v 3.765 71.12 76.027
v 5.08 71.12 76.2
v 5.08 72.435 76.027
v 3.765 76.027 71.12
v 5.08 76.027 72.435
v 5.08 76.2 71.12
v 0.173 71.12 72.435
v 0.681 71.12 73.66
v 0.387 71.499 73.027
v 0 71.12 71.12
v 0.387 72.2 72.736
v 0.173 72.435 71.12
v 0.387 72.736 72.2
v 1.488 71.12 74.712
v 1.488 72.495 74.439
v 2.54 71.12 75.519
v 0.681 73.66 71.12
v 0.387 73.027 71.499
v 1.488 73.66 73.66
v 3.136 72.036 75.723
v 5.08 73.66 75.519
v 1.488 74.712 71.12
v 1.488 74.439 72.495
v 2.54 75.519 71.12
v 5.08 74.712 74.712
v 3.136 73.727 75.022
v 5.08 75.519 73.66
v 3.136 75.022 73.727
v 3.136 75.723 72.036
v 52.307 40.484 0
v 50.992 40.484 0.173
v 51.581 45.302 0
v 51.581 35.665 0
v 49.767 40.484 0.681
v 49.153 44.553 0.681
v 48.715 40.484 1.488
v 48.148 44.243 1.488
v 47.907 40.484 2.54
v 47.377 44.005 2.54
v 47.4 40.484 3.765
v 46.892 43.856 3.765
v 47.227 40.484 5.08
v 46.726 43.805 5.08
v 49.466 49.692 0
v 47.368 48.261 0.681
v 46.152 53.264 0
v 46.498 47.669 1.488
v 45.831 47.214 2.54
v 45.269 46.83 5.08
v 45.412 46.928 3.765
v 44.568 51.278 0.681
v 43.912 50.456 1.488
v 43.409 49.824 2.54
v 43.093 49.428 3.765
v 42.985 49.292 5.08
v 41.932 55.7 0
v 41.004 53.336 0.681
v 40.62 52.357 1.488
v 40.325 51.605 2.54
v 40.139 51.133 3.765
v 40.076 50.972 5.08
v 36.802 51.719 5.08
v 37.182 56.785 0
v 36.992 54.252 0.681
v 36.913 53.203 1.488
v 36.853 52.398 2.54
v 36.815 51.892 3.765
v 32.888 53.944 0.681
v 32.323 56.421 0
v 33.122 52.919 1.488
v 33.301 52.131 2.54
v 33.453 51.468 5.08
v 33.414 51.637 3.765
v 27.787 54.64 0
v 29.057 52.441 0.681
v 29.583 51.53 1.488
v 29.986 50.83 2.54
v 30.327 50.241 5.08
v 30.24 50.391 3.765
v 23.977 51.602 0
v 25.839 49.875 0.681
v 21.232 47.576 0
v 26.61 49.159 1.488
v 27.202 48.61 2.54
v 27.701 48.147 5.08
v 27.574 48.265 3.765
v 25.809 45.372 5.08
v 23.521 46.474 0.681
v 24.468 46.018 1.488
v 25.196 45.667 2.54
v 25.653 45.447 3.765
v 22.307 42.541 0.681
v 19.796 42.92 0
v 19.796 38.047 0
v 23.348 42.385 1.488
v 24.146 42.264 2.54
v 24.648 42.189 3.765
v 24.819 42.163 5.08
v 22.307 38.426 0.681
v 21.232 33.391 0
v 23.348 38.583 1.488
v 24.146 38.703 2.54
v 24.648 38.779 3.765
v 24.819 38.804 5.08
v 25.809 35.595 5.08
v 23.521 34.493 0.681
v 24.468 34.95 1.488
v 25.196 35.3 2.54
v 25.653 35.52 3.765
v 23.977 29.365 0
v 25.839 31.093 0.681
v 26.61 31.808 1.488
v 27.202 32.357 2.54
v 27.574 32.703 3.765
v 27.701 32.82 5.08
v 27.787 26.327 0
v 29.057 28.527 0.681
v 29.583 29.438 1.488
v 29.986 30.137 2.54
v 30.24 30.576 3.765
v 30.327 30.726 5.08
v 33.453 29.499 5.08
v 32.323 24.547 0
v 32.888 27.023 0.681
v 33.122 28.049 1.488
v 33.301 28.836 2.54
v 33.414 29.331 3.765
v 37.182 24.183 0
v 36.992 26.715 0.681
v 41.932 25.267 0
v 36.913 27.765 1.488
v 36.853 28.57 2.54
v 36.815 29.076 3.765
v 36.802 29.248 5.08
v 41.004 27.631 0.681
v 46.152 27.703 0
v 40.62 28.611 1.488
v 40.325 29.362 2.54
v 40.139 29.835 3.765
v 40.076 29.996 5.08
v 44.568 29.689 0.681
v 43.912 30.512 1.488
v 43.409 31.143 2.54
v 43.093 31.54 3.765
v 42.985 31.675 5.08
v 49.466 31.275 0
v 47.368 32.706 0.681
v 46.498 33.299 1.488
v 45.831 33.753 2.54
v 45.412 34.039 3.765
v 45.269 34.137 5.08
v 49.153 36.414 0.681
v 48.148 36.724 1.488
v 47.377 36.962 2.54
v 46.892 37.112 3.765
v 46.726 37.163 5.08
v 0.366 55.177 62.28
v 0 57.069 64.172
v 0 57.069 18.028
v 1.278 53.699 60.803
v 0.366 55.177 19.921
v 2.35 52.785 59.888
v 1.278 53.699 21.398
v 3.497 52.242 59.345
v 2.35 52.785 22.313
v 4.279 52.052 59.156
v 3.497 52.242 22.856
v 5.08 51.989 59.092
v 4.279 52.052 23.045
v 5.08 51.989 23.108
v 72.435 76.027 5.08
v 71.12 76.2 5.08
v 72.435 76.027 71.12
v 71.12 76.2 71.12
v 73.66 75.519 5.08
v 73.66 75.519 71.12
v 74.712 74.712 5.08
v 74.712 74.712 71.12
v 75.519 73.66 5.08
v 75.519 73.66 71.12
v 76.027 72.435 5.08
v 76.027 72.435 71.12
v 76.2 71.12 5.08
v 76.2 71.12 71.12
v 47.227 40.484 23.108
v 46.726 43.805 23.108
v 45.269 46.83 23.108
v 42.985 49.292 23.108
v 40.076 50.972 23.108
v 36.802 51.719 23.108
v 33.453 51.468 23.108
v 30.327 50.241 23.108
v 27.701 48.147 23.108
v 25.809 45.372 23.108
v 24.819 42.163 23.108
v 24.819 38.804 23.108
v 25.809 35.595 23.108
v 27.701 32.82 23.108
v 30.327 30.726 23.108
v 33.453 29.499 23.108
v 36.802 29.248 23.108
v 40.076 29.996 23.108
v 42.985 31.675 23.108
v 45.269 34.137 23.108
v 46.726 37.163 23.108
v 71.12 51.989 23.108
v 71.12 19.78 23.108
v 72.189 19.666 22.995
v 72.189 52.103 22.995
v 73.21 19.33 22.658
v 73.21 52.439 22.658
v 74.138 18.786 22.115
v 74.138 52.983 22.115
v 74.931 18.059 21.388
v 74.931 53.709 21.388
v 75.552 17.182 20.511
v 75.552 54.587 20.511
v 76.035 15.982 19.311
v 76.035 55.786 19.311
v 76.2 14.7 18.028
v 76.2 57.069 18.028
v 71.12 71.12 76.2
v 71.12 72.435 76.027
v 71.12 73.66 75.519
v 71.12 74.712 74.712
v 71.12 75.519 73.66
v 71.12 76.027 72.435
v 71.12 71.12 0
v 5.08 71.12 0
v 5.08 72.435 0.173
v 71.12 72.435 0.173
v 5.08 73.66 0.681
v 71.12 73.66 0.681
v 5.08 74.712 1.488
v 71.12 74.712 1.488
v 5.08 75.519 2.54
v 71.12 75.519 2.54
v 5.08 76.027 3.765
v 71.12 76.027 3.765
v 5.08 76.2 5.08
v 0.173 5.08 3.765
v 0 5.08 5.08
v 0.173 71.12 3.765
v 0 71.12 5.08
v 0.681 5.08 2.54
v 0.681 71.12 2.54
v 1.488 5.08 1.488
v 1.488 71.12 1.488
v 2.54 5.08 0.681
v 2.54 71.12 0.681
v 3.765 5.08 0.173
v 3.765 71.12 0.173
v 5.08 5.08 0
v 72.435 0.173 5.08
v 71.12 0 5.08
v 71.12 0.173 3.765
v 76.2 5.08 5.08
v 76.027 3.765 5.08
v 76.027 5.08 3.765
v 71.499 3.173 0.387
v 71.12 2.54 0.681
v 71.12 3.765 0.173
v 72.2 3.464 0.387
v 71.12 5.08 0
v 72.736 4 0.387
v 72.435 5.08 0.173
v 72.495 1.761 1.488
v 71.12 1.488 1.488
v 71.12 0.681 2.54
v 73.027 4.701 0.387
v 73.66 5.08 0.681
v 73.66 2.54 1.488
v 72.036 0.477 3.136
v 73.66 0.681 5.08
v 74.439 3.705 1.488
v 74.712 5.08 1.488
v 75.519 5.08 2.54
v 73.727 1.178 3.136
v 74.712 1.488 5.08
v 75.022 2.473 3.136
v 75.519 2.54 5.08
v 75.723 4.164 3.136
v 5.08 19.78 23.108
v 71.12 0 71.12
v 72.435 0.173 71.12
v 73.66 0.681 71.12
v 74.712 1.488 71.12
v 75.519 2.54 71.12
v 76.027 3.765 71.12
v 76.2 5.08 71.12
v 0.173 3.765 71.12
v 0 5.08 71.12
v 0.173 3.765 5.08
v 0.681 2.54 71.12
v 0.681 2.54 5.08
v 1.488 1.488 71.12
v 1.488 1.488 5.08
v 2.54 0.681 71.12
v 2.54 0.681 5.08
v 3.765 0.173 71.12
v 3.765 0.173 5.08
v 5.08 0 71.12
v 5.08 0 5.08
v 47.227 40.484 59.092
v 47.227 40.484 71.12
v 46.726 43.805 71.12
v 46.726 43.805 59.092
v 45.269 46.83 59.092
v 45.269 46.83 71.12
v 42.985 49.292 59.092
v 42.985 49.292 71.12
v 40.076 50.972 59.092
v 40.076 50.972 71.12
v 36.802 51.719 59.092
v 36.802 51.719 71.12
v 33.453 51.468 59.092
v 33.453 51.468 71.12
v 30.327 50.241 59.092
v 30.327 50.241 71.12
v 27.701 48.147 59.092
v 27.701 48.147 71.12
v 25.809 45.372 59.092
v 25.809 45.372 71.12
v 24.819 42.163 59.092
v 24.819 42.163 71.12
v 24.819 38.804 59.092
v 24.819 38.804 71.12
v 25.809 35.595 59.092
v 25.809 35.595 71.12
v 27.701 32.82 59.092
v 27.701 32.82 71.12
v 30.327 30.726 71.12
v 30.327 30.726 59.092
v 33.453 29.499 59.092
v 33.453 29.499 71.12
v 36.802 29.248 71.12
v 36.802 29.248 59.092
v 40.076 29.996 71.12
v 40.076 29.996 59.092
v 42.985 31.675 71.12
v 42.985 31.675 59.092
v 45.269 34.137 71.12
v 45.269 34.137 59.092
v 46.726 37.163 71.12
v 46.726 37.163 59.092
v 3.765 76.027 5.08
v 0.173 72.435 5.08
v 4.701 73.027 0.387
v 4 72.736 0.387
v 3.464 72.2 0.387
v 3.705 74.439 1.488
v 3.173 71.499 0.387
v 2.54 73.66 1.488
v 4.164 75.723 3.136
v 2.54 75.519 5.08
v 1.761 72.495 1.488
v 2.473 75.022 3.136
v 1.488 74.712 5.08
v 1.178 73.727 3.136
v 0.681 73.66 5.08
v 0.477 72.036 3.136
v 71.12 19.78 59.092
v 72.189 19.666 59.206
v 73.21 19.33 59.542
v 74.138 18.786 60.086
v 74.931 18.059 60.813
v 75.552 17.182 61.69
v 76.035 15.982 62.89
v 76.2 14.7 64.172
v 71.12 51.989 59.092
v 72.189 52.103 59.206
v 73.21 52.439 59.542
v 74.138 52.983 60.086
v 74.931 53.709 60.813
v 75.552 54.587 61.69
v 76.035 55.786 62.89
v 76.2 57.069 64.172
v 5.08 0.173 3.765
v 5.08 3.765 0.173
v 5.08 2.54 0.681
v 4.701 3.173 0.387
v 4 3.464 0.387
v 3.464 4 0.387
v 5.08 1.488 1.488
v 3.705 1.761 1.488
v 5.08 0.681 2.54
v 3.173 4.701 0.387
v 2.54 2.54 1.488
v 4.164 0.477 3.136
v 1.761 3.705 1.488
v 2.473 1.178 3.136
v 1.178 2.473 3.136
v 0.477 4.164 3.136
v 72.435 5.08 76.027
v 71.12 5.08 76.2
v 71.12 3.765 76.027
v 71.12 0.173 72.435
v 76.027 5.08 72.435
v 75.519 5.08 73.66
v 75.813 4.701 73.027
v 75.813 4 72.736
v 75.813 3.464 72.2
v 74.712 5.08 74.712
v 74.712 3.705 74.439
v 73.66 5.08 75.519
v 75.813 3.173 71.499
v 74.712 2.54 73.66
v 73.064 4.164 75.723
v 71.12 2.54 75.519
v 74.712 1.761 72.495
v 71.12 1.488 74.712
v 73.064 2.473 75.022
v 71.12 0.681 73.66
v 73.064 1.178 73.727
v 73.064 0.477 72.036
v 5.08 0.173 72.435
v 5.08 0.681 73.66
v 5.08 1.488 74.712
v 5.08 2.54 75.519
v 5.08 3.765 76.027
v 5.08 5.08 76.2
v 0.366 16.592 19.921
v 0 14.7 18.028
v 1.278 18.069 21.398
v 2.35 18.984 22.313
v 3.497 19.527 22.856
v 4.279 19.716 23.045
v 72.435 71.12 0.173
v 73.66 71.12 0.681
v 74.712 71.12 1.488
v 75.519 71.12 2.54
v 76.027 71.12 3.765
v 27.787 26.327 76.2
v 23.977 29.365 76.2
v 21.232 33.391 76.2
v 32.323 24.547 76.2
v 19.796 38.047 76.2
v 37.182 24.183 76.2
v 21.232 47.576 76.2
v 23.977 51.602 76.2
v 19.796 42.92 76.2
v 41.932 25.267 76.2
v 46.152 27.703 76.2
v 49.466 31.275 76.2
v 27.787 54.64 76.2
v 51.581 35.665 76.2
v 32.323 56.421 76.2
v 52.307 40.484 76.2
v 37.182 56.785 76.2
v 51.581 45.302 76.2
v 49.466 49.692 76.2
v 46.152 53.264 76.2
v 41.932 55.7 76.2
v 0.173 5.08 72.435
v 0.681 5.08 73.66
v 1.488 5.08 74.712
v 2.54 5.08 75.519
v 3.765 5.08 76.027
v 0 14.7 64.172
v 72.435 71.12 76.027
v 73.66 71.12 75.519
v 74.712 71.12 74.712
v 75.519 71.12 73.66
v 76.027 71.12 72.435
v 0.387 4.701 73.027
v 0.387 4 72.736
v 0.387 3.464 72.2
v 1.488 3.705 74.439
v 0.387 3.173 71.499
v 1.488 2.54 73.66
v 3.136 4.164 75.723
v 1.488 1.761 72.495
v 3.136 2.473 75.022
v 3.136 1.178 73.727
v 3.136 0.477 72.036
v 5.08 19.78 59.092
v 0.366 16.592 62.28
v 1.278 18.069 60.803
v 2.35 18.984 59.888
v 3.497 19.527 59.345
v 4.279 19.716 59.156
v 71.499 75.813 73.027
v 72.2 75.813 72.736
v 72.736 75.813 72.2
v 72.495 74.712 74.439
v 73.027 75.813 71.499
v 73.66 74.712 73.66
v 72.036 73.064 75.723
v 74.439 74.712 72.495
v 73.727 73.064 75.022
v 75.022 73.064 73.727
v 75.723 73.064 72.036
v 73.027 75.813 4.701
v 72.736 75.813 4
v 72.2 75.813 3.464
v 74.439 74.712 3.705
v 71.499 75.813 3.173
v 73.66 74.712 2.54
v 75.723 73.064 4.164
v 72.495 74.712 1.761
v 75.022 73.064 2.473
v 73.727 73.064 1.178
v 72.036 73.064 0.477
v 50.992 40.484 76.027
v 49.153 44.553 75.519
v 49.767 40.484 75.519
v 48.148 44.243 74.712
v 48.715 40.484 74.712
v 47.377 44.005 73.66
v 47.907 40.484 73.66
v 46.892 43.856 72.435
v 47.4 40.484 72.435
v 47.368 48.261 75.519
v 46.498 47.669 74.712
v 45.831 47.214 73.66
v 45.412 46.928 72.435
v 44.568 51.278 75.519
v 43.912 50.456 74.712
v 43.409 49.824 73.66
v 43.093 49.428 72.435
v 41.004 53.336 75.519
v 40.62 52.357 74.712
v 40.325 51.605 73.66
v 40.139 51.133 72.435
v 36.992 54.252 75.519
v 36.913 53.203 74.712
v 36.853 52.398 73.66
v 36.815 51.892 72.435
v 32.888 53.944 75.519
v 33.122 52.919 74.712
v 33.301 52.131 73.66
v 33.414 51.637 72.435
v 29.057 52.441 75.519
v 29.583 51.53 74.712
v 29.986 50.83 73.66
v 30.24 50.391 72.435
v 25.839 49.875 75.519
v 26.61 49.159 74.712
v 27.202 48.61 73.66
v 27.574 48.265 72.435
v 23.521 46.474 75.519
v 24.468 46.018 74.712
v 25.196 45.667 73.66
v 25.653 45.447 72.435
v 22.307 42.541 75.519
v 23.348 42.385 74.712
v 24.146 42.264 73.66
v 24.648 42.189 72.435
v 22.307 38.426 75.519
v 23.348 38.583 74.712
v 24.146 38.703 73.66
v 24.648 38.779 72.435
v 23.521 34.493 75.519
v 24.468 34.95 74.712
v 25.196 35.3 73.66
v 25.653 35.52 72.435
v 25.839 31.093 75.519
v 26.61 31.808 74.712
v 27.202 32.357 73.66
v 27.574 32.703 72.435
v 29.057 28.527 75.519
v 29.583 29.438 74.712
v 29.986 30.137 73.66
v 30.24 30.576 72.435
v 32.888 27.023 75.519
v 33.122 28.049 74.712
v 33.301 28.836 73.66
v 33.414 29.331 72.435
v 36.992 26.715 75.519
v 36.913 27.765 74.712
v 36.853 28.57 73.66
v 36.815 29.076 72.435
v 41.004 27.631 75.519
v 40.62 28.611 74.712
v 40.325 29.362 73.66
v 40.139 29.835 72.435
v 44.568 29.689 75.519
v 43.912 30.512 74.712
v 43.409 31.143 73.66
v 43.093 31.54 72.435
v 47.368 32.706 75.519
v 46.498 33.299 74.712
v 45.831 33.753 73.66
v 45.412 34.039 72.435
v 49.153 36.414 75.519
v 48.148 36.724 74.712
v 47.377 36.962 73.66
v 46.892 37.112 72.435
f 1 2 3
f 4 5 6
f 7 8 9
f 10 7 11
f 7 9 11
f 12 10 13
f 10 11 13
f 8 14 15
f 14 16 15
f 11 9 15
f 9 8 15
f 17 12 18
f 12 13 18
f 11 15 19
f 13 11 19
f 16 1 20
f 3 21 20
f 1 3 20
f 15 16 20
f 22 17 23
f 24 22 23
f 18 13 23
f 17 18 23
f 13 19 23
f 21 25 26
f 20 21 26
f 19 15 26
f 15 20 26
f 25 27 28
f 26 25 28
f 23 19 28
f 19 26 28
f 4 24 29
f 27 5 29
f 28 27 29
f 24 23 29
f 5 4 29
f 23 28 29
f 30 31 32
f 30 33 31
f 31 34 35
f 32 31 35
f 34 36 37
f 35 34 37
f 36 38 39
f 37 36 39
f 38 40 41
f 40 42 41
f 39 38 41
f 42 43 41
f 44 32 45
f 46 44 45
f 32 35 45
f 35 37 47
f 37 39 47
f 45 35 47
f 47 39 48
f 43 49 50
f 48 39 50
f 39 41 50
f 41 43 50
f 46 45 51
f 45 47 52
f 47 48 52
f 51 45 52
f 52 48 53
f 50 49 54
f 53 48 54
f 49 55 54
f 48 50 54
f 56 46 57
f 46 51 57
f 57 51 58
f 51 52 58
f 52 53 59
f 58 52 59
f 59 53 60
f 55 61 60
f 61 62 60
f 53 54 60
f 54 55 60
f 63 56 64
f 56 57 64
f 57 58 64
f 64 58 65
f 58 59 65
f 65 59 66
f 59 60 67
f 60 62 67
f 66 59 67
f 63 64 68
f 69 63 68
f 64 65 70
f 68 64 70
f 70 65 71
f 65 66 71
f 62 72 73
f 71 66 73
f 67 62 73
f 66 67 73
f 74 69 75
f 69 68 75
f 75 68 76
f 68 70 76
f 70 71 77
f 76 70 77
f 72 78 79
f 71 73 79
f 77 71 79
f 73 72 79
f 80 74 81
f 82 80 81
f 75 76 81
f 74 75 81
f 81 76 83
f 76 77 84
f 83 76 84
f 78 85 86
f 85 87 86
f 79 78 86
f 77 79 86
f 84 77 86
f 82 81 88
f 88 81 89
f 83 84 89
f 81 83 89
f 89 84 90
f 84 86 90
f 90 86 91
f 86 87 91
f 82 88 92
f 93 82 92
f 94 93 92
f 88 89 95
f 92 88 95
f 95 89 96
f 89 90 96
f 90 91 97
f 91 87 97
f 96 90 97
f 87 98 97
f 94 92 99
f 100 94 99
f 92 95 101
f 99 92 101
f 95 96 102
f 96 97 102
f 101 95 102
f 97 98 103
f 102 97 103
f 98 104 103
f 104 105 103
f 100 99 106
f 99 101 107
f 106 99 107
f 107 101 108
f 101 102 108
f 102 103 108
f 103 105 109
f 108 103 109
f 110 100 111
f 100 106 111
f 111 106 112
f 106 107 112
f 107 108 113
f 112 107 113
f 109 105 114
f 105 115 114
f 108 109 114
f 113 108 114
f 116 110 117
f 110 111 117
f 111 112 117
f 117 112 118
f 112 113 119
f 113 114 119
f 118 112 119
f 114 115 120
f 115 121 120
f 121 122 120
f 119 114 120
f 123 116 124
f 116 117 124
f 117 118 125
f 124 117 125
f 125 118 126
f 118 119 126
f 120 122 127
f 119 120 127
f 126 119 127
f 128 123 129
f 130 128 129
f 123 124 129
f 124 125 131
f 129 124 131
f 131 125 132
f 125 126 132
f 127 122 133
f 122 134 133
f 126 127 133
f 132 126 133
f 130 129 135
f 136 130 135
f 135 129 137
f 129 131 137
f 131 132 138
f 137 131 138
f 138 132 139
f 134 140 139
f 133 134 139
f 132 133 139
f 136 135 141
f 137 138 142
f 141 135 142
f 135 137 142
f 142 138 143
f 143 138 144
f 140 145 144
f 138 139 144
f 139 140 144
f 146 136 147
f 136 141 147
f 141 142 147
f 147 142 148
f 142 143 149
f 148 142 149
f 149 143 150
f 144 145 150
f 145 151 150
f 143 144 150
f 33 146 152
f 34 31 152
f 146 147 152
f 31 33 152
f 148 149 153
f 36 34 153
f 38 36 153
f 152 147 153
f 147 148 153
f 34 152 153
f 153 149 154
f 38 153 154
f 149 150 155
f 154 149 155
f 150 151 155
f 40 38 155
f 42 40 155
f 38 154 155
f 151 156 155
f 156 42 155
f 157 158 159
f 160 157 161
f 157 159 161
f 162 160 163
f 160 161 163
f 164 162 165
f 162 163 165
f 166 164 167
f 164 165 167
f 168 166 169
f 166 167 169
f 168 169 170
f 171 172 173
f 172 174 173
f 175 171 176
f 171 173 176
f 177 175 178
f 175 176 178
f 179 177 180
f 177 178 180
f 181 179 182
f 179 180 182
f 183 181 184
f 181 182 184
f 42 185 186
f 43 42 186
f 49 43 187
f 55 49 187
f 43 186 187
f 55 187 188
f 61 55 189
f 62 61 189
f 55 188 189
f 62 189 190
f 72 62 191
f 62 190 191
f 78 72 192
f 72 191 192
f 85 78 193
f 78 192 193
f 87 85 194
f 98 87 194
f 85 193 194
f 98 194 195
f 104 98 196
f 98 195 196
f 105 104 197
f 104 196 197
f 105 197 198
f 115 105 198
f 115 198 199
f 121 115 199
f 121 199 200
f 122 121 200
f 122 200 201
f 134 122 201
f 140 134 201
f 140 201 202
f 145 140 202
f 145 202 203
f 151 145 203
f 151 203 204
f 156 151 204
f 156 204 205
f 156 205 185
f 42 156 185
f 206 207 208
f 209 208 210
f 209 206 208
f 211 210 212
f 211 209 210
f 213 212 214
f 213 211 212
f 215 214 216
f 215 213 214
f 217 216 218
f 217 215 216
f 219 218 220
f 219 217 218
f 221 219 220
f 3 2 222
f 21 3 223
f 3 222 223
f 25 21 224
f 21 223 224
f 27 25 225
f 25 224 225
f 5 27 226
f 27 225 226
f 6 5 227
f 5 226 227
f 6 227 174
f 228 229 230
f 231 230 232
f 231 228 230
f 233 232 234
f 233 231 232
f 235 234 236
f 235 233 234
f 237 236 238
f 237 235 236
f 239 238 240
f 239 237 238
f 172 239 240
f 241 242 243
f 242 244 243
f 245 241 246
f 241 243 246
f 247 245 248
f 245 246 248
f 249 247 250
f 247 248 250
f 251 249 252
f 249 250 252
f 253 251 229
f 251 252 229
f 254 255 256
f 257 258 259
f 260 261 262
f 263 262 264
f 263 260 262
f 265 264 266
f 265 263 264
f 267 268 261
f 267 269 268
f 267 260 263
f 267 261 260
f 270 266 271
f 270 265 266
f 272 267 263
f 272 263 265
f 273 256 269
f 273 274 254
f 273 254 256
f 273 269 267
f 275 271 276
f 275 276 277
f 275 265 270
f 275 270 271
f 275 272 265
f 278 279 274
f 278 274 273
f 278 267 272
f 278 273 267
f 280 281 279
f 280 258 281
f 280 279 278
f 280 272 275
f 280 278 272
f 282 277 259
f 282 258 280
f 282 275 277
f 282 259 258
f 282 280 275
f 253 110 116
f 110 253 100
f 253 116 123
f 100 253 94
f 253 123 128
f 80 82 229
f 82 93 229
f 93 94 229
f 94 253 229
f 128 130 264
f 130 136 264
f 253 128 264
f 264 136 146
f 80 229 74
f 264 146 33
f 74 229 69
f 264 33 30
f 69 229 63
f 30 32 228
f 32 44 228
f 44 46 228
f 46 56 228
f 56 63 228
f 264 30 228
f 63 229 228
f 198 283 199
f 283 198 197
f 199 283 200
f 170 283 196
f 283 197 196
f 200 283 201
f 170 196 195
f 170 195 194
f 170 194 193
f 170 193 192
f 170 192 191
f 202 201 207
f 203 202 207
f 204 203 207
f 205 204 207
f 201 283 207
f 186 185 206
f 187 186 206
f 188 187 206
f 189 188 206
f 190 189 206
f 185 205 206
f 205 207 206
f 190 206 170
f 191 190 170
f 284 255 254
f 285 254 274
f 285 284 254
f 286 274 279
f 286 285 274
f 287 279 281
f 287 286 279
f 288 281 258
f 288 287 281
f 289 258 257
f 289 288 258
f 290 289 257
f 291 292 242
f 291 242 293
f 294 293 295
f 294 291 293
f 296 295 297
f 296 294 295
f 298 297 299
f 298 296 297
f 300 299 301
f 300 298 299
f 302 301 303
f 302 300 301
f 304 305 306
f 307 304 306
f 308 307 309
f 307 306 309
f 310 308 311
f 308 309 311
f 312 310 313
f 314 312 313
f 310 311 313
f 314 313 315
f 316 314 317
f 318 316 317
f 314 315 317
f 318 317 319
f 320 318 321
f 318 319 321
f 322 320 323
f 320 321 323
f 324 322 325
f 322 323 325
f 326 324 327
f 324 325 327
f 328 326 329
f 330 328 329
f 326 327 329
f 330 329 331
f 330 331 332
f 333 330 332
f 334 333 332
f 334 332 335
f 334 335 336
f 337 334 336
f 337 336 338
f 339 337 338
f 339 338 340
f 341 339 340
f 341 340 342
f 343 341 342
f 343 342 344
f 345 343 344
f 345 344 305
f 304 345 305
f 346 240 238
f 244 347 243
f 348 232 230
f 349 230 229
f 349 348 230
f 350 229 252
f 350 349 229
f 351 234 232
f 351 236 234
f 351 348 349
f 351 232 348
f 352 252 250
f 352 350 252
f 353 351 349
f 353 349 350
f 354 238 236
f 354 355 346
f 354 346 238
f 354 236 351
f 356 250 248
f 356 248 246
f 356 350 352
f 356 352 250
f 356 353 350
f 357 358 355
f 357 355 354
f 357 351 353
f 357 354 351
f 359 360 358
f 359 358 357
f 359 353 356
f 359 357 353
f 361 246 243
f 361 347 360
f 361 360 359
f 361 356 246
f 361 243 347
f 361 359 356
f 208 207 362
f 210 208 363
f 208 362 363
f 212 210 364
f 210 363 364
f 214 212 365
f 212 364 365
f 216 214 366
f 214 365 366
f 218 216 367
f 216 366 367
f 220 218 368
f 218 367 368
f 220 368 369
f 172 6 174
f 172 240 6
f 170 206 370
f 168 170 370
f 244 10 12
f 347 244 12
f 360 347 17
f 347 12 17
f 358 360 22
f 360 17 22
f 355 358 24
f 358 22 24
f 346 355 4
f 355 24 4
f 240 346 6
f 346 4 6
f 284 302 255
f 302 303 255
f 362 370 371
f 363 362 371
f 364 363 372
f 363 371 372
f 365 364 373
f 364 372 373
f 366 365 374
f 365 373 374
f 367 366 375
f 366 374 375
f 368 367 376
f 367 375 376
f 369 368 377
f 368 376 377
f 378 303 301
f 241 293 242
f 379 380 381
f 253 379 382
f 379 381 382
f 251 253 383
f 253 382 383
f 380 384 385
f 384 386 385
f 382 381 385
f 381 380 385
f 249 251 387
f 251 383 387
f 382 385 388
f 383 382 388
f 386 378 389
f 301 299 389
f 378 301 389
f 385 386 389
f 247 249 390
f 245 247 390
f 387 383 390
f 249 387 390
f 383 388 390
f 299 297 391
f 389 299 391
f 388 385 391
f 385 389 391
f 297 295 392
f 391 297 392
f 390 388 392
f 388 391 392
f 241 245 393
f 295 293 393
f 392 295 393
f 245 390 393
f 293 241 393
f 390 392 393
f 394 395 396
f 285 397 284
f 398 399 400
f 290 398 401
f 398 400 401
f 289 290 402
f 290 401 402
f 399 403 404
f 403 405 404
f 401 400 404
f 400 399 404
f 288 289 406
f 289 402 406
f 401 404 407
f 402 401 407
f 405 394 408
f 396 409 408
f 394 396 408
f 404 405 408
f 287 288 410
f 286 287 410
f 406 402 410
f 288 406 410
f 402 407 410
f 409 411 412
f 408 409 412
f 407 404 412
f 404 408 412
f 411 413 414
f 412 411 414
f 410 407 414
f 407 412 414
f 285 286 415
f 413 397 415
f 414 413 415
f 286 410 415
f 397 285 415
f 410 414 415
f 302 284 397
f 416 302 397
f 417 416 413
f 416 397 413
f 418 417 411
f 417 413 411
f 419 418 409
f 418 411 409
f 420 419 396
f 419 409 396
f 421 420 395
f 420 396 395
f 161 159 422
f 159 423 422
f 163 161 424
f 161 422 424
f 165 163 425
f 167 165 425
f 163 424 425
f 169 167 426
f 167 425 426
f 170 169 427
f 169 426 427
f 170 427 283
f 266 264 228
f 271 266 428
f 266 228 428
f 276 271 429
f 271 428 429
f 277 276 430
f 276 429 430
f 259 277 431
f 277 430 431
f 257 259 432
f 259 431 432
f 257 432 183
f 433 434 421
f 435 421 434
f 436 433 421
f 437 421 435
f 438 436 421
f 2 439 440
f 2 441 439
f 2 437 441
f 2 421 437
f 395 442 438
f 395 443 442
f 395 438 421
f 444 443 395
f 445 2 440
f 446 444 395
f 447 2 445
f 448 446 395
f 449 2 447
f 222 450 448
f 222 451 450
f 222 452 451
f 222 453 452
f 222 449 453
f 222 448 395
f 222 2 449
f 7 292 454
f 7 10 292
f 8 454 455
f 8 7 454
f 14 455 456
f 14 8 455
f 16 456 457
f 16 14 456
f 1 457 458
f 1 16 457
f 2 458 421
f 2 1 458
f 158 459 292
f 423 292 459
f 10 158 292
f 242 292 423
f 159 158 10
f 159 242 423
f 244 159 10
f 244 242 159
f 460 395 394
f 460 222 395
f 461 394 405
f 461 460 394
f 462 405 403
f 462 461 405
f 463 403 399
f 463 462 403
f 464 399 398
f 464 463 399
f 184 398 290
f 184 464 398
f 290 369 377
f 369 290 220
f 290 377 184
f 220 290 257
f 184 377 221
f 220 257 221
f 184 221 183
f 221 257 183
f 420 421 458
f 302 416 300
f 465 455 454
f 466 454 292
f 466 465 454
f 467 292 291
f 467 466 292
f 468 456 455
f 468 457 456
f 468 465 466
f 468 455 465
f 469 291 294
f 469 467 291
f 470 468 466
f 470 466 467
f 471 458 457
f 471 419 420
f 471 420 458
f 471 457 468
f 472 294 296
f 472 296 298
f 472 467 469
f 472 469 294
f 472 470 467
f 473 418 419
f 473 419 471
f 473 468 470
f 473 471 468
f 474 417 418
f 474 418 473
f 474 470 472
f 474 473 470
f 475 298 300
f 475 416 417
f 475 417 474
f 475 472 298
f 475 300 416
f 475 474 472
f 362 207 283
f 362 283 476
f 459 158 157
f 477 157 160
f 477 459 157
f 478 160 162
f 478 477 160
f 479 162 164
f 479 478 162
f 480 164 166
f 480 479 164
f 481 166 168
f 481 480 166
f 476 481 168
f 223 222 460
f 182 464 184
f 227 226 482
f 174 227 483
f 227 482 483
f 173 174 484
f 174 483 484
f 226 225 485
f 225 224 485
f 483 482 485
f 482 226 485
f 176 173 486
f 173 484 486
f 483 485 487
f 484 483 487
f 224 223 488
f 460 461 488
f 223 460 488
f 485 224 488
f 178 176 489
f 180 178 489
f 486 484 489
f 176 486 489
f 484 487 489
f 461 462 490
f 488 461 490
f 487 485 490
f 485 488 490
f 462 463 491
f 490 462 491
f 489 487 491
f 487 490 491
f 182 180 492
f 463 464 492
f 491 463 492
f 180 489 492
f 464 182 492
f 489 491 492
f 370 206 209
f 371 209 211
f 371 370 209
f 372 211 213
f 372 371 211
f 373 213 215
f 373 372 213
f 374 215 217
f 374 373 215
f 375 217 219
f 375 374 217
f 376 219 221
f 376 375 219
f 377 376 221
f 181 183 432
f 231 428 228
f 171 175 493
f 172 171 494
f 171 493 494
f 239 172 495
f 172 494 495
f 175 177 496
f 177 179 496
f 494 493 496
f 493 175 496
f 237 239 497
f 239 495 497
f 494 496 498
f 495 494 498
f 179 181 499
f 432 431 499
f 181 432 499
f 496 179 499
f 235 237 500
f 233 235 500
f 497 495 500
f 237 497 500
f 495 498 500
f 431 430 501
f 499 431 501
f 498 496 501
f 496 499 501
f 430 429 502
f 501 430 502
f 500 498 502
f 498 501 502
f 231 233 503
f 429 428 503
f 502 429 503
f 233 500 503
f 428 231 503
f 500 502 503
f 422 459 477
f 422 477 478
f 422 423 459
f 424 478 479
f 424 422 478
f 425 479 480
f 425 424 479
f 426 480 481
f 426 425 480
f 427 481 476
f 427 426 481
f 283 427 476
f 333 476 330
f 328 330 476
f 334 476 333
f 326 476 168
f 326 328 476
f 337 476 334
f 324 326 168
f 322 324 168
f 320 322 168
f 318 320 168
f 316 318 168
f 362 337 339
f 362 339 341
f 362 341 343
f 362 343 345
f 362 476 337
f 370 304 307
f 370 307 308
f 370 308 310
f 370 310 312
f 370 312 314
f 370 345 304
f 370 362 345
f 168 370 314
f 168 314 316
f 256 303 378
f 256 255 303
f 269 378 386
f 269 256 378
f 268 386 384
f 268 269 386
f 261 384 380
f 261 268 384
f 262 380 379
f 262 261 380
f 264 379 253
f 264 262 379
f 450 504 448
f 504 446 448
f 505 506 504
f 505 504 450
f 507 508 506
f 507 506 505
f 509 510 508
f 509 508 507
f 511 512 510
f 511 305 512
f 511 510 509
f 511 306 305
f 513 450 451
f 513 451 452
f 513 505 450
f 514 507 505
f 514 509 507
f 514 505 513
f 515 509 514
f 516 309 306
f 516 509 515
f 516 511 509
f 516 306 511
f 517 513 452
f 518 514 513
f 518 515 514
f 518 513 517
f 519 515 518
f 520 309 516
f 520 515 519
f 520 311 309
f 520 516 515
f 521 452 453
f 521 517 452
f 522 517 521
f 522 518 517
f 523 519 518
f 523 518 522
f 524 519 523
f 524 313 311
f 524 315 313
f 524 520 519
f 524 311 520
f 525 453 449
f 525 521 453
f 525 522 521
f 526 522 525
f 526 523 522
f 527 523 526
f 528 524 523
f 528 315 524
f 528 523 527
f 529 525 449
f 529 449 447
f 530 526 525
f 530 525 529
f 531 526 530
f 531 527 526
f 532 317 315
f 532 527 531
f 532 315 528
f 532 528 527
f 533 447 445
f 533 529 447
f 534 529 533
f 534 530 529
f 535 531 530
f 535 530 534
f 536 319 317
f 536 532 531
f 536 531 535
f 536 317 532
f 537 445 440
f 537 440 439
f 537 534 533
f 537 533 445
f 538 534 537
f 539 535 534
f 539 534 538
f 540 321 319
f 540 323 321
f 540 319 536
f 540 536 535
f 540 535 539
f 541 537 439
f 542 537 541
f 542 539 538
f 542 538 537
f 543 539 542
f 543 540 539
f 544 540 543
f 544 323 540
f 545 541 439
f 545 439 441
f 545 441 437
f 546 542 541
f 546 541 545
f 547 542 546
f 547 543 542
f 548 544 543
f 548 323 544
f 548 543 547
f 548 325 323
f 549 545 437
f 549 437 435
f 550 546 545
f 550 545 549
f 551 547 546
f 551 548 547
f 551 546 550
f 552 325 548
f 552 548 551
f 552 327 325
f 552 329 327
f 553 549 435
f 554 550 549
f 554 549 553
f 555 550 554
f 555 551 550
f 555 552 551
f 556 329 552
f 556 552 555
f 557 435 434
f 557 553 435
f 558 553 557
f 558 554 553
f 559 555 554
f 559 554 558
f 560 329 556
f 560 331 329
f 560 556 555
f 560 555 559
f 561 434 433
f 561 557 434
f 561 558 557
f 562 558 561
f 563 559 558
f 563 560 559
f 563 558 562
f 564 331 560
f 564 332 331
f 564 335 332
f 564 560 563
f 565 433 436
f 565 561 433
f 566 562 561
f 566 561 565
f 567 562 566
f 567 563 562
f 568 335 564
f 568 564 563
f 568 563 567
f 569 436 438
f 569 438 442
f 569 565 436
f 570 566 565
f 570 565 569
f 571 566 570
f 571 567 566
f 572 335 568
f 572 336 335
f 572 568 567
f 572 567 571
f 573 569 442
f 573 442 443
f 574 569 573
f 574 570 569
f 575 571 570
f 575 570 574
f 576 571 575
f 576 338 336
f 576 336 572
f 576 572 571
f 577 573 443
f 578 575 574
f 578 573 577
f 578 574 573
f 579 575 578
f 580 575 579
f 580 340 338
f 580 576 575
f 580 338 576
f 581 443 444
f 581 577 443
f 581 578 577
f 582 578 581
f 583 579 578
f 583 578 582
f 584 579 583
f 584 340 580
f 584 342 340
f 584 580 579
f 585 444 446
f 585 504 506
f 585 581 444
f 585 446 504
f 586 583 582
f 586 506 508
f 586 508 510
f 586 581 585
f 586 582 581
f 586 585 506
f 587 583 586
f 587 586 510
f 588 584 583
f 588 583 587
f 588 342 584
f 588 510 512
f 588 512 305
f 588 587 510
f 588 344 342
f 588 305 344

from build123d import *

# Parameters (mm, degrees)
F0_W     = 76.2
F0_H     = 76.2
F1_DEPTH = 76.2
F2_R     = 11.2668024736
F3_DEPTH = 76.201
F4_W     = 32.2091430426
F4_H     = 35.9837710857
F5_DEPTH = 76.201
F6_R     = 5.08
F7_R     = 5.08


with BuildPart() as f1:
    # F0 (on Top) → F1 (new body)
    with BuildSketch(Plane.XY):
        with Locations((38.1, 38.1)):
            Rectangle(F0_W, F0_H)
    extrude(amount=F1_DEPTH)

    # F2 (on face) → F3 (cut, through all)
    with BuildSketch(Plane.XY.offset(76.2)):
        with Locations((35.9600186348, 40.4836237431)):
            Circle(F2_R)
    extrude(amount=-F3_DEPTH, mode=Mode.SUBTRACT)

    # F4 (on face) → F5 (cut, through all)
    with BuildSketch(Plane.YZ.offset(76.2)):
        with Locations((35.8842462301, 41.1003679037)):
            Rectangle(F4_W, F4_H)
    extrude(amount=-F5_DEPTH, mode=Mode.SUBTRACT)

    # F6
    f6_edges = [f1.edges().sort_by_distance(p)[0] for p in [
        (38.1, 0, 76.2),
        (76.2, 38.1, 76.2),
        (38.1, 76.2, 76.2),
        (0, 38.1, 76.2),
        (0, 0, 38.1),
        (76.2, 0, 38.1),
        (38.1, 0, 0),
        (76.2, 38.1, 0),
        (76.2, 35.884246, 23.108482),
        (76.2, 51.988818, 41.100368),
        (76.2, 76.2, 38.1),
        (76.2, 19.779675, 41.100368),
        (76.2, 35.884246, 59.092253),
        (0, 76.2, 38.1),
        (38.1, 76.2, 0),
        (0, 38.1, 0),
        (24.693216, 40.483624, 0),
    ]]
    fillet(f6_edges, radius=F6_R)

    # F7
    f7_edges = [f1.edges().sort_by_distance(p)[0] for p in [
        (38.1, 5.08, 76.2),
        (5.08, 38.1, 76.2),
        (71.12, 38.1, 76.2),
        (38.1, 71.12, 76.2),
        (24.693216, 40.483624, 76.2),
        (0, 38.1, 71.12),
        (0, 71.12, 38.1),
        (0, 5.08, 38.1),
        (0, 38.1, 5.08),
        (0, 51.988818, 41.100368),
        (0, 35.884246, 59.092253),
        (0, 19.779675, 41.100368),
        (0, 35.884246, 23.108482),
    ]]
    fillet(f7_edges, radius=F7_R)


solid = f1.part
